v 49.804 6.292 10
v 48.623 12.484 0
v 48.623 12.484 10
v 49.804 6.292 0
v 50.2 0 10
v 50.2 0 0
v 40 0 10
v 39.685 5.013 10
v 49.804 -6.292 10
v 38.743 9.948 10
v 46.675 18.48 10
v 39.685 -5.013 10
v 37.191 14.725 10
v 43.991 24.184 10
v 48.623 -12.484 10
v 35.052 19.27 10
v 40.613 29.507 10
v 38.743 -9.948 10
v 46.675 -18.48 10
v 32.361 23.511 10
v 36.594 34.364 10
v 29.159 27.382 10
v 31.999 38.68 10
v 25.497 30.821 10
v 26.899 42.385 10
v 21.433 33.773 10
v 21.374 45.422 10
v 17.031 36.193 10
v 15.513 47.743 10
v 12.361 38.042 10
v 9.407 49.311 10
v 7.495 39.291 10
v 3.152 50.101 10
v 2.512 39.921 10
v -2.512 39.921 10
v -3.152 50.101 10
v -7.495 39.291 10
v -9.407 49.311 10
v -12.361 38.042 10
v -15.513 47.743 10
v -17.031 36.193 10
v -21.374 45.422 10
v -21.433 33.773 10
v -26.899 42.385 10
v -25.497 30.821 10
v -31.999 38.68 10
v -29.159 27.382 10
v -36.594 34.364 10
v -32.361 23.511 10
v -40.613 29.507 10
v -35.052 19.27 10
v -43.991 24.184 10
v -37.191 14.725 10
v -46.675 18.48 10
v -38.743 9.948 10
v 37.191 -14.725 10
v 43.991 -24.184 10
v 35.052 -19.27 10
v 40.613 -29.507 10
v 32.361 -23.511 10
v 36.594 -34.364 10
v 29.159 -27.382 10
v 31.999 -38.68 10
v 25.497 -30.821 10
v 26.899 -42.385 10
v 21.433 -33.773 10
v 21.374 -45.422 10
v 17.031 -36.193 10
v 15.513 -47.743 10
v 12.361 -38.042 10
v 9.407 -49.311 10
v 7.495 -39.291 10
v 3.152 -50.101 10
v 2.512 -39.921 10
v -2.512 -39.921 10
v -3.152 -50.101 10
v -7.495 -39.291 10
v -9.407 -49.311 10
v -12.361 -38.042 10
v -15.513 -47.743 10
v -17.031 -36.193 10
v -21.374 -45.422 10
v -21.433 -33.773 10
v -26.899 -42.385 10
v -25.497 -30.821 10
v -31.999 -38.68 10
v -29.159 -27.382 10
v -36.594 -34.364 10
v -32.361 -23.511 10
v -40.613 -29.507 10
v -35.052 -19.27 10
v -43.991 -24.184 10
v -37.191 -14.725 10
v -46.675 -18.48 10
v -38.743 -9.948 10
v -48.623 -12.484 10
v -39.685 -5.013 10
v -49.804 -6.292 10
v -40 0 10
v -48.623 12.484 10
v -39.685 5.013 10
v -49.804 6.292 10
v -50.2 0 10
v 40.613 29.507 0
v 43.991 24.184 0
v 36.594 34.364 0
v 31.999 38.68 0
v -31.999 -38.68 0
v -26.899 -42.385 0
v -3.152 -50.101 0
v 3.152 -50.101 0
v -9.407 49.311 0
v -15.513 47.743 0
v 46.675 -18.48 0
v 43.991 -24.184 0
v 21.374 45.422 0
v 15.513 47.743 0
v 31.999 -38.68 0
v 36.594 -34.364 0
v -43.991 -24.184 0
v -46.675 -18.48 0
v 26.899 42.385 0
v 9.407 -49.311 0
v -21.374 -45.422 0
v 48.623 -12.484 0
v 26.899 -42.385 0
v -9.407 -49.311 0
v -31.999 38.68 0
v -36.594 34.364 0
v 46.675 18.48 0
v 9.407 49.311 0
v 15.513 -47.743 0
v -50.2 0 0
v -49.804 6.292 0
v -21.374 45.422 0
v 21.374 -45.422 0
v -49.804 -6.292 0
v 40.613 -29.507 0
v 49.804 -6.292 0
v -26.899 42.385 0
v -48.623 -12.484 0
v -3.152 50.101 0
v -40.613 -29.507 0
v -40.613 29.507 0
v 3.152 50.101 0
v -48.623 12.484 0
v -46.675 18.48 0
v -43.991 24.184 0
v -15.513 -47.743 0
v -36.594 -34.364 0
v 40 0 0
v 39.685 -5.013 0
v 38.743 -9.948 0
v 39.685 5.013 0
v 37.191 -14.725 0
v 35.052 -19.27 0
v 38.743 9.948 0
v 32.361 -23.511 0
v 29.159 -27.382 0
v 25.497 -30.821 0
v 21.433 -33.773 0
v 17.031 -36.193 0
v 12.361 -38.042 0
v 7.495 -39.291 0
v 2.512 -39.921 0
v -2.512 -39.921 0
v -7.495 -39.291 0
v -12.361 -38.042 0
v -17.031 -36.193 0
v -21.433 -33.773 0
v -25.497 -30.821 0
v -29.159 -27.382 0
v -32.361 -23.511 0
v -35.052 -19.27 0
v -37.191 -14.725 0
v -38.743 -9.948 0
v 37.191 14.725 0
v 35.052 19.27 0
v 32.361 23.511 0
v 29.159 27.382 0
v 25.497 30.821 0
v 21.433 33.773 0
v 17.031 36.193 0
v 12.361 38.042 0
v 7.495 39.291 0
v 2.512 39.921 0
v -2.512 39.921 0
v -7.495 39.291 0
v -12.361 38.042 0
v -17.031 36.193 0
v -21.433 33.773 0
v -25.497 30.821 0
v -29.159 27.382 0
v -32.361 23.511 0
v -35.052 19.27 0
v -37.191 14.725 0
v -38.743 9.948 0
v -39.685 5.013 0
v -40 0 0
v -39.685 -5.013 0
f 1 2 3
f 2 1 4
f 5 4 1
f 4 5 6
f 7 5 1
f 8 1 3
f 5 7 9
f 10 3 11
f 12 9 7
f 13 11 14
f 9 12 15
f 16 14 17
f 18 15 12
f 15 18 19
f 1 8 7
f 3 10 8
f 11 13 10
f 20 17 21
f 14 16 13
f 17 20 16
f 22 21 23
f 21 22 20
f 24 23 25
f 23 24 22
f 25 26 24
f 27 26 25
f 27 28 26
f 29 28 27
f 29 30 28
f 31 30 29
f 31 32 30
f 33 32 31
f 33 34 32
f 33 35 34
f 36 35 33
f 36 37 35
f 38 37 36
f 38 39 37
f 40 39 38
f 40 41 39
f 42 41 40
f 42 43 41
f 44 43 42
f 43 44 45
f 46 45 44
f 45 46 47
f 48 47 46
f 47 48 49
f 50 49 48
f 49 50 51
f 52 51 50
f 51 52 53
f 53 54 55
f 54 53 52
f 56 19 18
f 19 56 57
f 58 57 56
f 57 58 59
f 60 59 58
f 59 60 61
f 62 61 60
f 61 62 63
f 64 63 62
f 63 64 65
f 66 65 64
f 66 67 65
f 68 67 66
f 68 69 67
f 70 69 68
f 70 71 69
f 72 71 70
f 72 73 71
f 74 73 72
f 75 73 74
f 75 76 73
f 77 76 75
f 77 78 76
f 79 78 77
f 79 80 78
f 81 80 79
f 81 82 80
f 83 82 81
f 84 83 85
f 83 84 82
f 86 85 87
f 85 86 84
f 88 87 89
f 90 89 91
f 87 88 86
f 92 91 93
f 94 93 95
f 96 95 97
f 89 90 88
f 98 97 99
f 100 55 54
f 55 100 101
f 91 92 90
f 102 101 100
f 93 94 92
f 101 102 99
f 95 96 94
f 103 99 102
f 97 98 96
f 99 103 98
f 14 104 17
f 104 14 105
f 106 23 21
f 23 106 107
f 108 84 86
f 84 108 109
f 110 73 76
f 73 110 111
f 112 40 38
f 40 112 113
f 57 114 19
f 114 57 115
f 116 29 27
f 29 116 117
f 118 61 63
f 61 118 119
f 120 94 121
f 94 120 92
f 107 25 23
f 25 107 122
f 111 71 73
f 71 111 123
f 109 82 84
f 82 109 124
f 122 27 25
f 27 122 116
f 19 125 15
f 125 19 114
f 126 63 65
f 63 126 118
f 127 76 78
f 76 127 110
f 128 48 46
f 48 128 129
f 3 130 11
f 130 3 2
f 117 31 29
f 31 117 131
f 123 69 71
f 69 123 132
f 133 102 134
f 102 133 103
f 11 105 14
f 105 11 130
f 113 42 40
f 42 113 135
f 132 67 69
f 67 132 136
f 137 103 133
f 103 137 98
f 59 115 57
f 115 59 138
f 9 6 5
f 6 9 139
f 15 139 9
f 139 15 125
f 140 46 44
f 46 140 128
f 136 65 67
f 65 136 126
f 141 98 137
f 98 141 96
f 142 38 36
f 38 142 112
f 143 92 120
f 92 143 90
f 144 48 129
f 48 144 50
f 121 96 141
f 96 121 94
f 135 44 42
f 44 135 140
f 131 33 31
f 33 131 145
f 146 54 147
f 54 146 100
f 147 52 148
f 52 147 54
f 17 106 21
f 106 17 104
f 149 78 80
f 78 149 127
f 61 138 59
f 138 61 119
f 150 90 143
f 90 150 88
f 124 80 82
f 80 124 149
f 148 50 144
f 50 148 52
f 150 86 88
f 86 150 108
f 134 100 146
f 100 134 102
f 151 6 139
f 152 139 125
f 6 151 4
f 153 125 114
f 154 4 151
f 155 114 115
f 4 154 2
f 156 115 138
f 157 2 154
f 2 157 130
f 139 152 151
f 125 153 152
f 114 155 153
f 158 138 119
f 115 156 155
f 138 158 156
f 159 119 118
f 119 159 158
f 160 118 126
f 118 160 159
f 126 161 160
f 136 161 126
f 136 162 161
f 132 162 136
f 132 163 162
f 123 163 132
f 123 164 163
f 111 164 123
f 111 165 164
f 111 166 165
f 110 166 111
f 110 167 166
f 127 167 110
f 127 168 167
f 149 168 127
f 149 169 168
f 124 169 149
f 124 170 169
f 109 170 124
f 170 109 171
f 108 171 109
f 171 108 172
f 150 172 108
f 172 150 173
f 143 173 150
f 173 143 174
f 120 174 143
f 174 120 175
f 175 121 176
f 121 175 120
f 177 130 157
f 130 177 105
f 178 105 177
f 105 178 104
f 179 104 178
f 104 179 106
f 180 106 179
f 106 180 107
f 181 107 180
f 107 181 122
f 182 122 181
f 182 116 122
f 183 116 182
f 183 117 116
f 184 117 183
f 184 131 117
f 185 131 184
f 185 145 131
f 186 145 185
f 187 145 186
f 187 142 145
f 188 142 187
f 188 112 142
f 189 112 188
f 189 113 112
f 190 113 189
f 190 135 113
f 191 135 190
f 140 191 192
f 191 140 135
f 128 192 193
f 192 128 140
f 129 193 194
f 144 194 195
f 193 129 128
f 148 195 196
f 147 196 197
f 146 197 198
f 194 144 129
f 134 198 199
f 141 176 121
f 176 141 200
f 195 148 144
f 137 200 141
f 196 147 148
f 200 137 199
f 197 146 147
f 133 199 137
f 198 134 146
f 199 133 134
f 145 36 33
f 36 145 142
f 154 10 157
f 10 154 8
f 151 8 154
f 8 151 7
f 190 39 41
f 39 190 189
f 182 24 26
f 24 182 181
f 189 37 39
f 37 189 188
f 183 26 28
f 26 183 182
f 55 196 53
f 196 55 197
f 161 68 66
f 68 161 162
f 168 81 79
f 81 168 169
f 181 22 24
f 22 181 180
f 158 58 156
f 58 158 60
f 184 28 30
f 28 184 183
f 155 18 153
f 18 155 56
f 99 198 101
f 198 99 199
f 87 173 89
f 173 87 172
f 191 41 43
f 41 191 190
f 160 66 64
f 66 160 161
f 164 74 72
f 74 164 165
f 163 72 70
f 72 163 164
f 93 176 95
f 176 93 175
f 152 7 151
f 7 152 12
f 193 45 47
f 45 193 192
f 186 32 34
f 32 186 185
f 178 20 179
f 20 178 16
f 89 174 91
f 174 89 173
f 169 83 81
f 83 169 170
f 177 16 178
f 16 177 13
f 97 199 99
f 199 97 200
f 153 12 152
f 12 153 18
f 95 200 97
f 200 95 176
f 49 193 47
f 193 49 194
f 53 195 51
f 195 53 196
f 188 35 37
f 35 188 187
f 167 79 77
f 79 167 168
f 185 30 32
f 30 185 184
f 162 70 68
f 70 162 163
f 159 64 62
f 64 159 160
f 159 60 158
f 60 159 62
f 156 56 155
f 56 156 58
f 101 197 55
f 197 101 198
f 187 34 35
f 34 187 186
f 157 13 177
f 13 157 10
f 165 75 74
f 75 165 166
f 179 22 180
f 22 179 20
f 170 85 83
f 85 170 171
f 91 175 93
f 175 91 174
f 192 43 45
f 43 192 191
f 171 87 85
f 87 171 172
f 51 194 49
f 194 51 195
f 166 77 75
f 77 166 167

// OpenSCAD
$fn = 50;


difference() {
	union() {
		cylinder(h = 10, r = 50.2000000000);
	}
	union() {
		cylinder(h = 10, r = 40.0000000000);
	}
}
